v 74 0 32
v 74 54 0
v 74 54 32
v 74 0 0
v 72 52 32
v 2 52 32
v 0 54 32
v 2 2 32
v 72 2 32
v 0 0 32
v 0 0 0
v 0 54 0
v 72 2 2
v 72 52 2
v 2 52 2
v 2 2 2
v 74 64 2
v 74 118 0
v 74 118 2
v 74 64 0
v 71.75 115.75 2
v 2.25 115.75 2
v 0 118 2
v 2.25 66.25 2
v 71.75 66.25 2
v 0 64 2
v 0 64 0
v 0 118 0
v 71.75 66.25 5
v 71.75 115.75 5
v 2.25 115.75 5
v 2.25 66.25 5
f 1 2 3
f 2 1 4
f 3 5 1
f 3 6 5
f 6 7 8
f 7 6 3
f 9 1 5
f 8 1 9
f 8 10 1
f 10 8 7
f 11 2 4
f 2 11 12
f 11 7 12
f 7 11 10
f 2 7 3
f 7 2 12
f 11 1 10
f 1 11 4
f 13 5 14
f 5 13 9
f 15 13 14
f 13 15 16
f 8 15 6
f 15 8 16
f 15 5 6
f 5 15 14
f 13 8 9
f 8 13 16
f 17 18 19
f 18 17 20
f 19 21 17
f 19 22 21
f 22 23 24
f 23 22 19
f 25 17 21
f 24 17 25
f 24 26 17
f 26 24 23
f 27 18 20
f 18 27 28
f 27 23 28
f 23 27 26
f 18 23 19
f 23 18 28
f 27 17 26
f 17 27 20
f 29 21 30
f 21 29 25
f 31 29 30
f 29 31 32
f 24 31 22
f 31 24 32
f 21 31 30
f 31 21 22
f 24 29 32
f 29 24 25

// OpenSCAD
// Box with a press-fit lid - a hollow rectangular box (open top) and a separate lid whose plug
// drops into the opening. The two parts are laid side by side. NOVEL general part.
//
// @desc hollow box with a separate press-fit lid
// @prompt Design a small box with a lid in OpenSCAD: an inner space {il} by {iw} by {ih} mm with {wall} mm walls, and a separate lid whose plug drops {lip} mm into the opening. Lay the two parts side by side. Reply with a single complete OpenSCAD file.
// @param il   inner length, mm     [20:80]
// @param iw   inner width, mm      [20:60]
// @param ih   inner height, mm     [10:50]
// @param wall wall thickness, mm   [1.6:4]
// @param lip  lid plug depth, mm   [3:10]

il   = 70;
iw   = 50;
ih   = 30;
wall = 2;
lip  = 3;

$fn = 32;

ol = il + 2 * wall;
ow = iw + 2 * wall;

module box() {
    difference() {
        cube([ol, ow, ih + wall]);
        translate([wall, wall, wall]) cube([il, iw, ih + 1]);   // open-top cavity
    }
}

module lid() {
    cl = il - 0.5;                 // plug: 0.25 mm clearance per side
    cw = iw - 0.5;
    union() {
        cube([ol, ow, wall]);                                    // top plate, full footprint
        translate([(ol - cl) / 2, (ow - cw) / 2, 0])
            cube([cl, cw, wall + lip]);                          // plug (overlaps the plate -> one solid)
    }
}

box();
translate([0, ow + 10, 0]) lid();
